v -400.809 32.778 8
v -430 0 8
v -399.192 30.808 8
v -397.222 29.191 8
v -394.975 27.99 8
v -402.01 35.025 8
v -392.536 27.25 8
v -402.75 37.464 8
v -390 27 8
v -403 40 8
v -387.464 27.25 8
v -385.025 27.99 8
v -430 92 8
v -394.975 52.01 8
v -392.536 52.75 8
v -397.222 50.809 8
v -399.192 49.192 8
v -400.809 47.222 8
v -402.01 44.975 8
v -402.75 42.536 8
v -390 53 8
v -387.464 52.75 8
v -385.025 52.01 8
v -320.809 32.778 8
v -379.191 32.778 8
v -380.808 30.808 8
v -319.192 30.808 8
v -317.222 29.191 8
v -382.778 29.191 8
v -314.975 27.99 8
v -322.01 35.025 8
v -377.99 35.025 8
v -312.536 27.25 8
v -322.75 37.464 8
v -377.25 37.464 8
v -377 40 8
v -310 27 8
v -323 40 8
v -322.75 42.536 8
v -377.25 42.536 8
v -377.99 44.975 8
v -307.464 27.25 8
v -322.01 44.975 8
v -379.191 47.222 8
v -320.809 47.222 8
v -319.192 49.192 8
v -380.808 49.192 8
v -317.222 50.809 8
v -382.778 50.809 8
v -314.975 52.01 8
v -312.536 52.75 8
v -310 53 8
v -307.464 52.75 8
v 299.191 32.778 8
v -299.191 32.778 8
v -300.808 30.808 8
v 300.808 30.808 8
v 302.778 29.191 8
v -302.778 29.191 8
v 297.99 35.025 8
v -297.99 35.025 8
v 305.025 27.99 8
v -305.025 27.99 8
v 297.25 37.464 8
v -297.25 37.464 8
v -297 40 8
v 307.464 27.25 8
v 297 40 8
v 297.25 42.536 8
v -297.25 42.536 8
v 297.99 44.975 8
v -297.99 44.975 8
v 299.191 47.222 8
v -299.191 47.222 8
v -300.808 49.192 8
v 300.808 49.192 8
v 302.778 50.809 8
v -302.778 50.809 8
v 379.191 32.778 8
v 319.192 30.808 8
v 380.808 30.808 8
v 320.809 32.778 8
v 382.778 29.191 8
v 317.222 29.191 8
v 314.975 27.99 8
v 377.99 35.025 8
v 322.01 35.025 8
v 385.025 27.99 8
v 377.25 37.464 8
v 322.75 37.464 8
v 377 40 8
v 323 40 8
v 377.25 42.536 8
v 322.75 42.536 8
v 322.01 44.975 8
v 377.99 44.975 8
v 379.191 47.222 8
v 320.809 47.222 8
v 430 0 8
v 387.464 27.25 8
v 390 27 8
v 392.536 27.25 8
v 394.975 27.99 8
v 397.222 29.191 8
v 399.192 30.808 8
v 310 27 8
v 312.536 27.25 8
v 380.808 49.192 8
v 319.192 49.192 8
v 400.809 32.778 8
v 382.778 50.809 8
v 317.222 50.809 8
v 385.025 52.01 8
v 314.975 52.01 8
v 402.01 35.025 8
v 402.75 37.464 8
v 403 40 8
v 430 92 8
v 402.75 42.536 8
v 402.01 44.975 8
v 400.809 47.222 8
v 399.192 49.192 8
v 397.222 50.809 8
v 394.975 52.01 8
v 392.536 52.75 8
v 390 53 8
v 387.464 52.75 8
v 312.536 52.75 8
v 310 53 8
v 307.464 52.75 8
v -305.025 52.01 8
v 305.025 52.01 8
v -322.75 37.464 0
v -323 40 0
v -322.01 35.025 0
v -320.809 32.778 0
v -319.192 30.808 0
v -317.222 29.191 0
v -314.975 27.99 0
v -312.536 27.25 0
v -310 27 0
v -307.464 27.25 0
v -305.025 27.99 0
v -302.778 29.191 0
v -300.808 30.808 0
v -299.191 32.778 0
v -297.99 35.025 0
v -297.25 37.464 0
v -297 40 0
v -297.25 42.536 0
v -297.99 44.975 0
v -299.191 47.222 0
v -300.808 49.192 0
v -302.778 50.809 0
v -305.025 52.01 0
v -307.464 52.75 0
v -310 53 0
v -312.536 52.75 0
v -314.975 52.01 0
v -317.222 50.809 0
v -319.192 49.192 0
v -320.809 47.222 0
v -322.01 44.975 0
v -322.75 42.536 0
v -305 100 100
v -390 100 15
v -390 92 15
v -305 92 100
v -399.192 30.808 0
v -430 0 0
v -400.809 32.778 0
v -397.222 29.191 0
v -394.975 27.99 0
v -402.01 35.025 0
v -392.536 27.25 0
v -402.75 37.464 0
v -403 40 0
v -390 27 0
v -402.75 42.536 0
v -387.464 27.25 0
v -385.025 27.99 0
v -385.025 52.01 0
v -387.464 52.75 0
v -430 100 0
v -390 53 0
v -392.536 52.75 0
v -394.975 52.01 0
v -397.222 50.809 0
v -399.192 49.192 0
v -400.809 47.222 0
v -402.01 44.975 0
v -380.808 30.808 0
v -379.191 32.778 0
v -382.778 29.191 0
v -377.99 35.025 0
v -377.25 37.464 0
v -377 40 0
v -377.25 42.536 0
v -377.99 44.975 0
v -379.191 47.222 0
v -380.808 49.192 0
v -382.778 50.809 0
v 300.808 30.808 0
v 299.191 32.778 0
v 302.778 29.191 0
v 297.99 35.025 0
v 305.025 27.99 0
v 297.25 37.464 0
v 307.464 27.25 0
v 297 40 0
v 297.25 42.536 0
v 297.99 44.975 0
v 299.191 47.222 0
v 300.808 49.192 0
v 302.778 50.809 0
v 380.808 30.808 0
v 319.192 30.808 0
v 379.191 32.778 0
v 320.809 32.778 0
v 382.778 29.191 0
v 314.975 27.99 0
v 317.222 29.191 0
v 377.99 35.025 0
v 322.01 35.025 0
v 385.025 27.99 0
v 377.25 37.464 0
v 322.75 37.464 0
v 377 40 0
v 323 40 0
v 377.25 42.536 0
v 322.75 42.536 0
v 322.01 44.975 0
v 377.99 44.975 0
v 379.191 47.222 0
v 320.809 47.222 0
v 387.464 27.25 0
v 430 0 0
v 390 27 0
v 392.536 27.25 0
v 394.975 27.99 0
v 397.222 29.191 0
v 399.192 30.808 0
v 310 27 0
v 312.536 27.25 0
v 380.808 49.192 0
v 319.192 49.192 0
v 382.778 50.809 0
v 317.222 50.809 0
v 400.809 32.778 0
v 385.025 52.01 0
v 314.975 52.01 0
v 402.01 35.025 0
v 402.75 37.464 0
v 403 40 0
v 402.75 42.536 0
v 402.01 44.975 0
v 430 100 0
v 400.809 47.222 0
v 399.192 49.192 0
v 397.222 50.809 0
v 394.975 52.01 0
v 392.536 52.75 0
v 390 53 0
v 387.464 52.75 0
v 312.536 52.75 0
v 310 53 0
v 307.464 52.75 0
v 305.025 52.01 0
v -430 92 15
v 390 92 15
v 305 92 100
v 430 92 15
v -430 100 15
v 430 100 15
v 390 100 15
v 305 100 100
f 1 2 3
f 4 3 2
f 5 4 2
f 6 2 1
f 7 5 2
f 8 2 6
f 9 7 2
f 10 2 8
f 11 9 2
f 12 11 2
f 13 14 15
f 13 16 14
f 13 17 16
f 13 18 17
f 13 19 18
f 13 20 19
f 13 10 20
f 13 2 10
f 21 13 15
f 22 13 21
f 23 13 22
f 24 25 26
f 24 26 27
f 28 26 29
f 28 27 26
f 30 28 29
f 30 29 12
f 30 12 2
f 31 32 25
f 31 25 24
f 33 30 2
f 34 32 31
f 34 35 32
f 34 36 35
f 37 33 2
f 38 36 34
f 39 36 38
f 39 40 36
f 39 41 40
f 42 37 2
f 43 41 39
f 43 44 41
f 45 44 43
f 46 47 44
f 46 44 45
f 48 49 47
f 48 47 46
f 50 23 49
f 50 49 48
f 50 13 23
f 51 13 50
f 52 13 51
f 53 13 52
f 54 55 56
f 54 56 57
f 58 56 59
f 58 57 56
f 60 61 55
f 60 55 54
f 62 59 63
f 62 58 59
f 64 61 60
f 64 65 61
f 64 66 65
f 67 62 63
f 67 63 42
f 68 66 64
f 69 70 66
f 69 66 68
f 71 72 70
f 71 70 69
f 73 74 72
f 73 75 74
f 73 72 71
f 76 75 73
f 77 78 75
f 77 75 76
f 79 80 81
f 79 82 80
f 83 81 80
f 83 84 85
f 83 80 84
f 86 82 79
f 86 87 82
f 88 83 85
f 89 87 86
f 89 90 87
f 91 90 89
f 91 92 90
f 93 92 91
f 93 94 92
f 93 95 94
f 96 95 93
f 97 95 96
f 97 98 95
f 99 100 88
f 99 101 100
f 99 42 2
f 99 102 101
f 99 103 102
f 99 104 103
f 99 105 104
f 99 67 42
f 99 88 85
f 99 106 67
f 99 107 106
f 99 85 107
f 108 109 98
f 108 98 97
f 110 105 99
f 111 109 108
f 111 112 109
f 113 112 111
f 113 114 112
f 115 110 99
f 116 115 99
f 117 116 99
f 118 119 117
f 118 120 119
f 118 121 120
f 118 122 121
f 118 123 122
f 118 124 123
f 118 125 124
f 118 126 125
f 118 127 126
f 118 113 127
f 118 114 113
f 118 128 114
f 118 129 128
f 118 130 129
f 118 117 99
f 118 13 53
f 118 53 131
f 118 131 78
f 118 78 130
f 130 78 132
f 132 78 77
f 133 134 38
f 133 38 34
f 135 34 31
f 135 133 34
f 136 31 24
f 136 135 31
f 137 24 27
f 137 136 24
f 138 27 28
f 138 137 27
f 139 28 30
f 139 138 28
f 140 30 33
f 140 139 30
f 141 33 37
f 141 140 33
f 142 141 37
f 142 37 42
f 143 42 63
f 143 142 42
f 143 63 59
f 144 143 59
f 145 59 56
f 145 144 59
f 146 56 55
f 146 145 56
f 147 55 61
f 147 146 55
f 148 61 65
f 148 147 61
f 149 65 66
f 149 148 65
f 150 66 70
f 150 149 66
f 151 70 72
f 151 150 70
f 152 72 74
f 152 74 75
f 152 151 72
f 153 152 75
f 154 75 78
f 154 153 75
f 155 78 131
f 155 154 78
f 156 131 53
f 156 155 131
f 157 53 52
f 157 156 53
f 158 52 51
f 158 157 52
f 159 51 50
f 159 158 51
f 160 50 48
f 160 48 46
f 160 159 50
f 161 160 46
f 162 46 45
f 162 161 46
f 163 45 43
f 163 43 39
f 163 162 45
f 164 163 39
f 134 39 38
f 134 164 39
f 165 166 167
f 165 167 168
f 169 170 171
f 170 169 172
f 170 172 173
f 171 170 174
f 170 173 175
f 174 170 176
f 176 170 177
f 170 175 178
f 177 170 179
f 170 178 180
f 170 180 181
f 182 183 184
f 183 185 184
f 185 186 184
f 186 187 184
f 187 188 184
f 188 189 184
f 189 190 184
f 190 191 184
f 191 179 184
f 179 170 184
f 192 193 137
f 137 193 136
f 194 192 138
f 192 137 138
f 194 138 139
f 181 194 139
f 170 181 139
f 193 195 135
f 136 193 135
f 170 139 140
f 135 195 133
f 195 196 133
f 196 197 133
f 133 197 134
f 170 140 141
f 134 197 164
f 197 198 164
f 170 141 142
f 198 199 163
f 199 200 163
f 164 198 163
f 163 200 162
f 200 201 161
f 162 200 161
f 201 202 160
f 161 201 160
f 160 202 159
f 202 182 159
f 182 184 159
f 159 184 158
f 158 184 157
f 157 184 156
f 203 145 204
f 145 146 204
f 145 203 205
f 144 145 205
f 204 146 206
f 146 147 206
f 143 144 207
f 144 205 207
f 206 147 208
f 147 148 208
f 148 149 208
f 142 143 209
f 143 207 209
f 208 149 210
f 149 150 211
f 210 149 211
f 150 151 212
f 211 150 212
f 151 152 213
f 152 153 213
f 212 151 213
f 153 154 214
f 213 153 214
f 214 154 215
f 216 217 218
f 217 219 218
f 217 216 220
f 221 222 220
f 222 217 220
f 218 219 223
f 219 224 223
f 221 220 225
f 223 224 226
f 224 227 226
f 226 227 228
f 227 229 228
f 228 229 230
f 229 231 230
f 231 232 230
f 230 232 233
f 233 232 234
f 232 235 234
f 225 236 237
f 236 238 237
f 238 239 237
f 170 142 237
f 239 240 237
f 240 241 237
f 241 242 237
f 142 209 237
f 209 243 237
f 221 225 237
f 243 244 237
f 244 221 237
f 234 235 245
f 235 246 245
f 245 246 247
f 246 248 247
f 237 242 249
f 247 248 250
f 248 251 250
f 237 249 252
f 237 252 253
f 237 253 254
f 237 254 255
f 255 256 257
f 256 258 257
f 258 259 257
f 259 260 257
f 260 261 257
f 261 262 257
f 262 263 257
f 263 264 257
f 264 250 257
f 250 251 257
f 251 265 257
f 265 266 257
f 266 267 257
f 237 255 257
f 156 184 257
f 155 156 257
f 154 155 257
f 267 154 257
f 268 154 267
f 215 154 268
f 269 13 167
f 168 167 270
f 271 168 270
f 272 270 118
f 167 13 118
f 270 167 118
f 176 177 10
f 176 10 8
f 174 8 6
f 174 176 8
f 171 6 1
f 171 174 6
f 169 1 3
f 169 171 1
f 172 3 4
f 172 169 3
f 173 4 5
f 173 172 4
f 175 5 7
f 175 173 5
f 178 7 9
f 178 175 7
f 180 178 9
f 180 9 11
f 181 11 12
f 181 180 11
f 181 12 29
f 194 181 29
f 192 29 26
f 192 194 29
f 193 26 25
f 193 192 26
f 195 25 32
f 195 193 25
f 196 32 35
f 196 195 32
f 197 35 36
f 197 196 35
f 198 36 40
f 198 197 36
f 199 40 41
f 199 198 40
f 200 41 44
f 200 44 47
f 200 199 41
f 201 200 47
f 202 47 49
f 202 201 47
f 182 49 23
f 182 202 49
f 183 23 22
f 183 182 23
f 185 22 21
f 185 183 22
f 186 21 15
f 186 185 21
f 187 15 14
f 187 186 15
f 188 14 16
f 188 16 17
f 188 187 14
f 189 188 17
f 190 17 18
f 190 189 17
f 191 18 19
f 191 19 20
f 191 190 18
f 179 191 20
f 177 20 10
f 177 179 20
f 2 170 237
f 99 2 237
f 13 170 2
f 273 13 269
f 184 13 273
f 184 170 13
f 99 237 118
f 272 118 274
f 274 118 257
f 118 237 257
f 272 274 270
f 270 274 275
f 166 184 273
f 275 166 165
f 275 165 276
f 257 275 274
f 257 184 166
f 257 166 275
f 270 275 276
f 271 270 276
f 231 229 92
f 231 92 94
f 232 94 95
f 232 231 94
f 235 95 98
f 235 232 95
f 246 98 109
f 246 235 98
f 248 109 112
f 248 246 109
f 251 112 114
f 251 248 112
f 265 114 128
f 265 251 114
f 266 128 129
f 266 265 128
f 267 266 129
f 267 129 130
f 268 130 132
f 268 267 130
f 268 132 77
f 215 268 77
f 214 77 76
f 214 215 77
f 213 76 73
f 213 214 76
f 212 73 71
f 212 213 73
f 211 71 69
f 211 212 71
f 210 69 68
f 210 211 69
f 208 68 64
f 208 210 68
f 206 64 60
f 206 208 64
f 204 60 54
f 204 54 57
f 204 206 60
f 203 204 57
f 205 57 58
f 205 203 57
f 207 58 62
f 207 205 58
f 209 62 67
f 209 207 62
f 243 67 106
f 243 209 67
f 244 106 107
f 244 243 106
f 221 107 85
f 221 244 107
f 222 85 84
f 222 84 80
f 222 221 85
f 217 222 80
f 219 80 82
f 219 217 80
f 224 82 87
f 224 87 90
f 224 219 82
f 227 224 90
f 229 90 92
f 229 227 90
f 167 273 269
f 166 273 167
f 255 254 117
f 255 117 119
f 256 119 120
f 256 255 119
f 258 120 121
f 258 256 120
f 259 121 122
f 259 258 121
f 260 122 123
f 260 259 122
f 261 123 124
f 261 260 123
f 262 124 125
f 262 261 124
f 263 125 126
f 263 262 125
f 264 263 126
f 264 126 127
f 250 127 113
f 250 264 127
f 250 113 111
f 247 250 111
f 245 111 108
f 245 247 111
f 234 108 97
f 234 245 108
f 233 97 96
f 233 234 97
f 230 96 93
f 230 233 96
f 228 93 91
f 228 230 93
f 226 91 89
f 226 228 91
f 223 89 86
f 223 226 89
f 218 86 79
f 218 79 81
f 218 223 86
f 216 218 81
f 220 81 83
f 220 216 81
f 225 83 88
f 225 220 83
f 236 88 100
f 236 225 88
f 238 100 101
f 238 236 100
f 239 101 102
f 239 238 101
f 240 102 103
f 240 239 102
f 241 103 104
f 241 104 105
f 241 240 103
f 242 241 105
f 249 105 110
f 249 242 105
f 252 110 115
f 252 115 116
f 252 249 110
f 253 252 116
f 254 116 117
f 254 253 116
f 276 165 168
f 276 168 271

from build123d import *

# Parameters (mm, degrees)
SKETCH_1_W          = 860
SKETCH_1_H          = 100
SKETCH_1_R          = 13
EXTRUDE_1_DEPTH     = 8
SKETCH_2_W          = 860
SKETCH_2_H          = 8
EXTRUDE_2_DEPTH     = 92
CUT_EXTRUDE_1_DEPTH = 453.65881191


with BuildPart() as part:
    # 草图1 → 凸台-拉伸1 (new body)
    with BuildSketch(Plane.XY):
        with Locations((0, 50)):
            Rectangle(SKETCH_1_W, SKETCH_1_H)
        with Locations((390, 40)):
            Circle(SKETCH_1_R, mode=Mode.SUBTRACT)
        with Locations((310, 40)):
            Circle(SKETCH_1_R, mode=Mode.SUBTRACT)
        with Locations(Location((-390, 40, 0), (0, 0, 180))):
            Circle(SKETCH_1_R, mode=Mode.SUBTRACT)
        with Locations(Location((-310, 40, 0), (0, 0, 180))):
            Circle(SKETCH_1_R, mode=Mode.SUBTRACT)
    extrude(amount=EXTRUDE_1_DEPTH)

    # 草图2 → 凸台-拉伸2 (add)
    with BuildSketch(Plane.XY.offset(8)):
        with Locations((0, 96)):
            Rectangle(SKETCH_2_W, SKETCH_2_H)
    extrude(amount=EXTRUDE_2_DEPTH)

    # 草图4 → 切除-拉伸1 (cut, through all)
    with BuildSketch(Plane(origin=(0, 100, 0), x_dir=(1, 0, 0), z_dir=(0, 1, 0))):
        Polygon((-430, -15), (-390, -15), (-305, -100), (-430, -100), align=None)
    cut_extrude_1 = extrude(amount=-CUT_EXTRUDE_1_DEPTH, mode=Mode.SUBTRACT)

    # 镜向1: 切除-拉伸1 across plane
    add(cut_extrude_1.mirror(Plane(origin=(0, 0, 0), x_dir=(0, 0, 1), z_dir=(1, 0, 0))), mode=Mode.SUBTRACT)


solid = part.part
